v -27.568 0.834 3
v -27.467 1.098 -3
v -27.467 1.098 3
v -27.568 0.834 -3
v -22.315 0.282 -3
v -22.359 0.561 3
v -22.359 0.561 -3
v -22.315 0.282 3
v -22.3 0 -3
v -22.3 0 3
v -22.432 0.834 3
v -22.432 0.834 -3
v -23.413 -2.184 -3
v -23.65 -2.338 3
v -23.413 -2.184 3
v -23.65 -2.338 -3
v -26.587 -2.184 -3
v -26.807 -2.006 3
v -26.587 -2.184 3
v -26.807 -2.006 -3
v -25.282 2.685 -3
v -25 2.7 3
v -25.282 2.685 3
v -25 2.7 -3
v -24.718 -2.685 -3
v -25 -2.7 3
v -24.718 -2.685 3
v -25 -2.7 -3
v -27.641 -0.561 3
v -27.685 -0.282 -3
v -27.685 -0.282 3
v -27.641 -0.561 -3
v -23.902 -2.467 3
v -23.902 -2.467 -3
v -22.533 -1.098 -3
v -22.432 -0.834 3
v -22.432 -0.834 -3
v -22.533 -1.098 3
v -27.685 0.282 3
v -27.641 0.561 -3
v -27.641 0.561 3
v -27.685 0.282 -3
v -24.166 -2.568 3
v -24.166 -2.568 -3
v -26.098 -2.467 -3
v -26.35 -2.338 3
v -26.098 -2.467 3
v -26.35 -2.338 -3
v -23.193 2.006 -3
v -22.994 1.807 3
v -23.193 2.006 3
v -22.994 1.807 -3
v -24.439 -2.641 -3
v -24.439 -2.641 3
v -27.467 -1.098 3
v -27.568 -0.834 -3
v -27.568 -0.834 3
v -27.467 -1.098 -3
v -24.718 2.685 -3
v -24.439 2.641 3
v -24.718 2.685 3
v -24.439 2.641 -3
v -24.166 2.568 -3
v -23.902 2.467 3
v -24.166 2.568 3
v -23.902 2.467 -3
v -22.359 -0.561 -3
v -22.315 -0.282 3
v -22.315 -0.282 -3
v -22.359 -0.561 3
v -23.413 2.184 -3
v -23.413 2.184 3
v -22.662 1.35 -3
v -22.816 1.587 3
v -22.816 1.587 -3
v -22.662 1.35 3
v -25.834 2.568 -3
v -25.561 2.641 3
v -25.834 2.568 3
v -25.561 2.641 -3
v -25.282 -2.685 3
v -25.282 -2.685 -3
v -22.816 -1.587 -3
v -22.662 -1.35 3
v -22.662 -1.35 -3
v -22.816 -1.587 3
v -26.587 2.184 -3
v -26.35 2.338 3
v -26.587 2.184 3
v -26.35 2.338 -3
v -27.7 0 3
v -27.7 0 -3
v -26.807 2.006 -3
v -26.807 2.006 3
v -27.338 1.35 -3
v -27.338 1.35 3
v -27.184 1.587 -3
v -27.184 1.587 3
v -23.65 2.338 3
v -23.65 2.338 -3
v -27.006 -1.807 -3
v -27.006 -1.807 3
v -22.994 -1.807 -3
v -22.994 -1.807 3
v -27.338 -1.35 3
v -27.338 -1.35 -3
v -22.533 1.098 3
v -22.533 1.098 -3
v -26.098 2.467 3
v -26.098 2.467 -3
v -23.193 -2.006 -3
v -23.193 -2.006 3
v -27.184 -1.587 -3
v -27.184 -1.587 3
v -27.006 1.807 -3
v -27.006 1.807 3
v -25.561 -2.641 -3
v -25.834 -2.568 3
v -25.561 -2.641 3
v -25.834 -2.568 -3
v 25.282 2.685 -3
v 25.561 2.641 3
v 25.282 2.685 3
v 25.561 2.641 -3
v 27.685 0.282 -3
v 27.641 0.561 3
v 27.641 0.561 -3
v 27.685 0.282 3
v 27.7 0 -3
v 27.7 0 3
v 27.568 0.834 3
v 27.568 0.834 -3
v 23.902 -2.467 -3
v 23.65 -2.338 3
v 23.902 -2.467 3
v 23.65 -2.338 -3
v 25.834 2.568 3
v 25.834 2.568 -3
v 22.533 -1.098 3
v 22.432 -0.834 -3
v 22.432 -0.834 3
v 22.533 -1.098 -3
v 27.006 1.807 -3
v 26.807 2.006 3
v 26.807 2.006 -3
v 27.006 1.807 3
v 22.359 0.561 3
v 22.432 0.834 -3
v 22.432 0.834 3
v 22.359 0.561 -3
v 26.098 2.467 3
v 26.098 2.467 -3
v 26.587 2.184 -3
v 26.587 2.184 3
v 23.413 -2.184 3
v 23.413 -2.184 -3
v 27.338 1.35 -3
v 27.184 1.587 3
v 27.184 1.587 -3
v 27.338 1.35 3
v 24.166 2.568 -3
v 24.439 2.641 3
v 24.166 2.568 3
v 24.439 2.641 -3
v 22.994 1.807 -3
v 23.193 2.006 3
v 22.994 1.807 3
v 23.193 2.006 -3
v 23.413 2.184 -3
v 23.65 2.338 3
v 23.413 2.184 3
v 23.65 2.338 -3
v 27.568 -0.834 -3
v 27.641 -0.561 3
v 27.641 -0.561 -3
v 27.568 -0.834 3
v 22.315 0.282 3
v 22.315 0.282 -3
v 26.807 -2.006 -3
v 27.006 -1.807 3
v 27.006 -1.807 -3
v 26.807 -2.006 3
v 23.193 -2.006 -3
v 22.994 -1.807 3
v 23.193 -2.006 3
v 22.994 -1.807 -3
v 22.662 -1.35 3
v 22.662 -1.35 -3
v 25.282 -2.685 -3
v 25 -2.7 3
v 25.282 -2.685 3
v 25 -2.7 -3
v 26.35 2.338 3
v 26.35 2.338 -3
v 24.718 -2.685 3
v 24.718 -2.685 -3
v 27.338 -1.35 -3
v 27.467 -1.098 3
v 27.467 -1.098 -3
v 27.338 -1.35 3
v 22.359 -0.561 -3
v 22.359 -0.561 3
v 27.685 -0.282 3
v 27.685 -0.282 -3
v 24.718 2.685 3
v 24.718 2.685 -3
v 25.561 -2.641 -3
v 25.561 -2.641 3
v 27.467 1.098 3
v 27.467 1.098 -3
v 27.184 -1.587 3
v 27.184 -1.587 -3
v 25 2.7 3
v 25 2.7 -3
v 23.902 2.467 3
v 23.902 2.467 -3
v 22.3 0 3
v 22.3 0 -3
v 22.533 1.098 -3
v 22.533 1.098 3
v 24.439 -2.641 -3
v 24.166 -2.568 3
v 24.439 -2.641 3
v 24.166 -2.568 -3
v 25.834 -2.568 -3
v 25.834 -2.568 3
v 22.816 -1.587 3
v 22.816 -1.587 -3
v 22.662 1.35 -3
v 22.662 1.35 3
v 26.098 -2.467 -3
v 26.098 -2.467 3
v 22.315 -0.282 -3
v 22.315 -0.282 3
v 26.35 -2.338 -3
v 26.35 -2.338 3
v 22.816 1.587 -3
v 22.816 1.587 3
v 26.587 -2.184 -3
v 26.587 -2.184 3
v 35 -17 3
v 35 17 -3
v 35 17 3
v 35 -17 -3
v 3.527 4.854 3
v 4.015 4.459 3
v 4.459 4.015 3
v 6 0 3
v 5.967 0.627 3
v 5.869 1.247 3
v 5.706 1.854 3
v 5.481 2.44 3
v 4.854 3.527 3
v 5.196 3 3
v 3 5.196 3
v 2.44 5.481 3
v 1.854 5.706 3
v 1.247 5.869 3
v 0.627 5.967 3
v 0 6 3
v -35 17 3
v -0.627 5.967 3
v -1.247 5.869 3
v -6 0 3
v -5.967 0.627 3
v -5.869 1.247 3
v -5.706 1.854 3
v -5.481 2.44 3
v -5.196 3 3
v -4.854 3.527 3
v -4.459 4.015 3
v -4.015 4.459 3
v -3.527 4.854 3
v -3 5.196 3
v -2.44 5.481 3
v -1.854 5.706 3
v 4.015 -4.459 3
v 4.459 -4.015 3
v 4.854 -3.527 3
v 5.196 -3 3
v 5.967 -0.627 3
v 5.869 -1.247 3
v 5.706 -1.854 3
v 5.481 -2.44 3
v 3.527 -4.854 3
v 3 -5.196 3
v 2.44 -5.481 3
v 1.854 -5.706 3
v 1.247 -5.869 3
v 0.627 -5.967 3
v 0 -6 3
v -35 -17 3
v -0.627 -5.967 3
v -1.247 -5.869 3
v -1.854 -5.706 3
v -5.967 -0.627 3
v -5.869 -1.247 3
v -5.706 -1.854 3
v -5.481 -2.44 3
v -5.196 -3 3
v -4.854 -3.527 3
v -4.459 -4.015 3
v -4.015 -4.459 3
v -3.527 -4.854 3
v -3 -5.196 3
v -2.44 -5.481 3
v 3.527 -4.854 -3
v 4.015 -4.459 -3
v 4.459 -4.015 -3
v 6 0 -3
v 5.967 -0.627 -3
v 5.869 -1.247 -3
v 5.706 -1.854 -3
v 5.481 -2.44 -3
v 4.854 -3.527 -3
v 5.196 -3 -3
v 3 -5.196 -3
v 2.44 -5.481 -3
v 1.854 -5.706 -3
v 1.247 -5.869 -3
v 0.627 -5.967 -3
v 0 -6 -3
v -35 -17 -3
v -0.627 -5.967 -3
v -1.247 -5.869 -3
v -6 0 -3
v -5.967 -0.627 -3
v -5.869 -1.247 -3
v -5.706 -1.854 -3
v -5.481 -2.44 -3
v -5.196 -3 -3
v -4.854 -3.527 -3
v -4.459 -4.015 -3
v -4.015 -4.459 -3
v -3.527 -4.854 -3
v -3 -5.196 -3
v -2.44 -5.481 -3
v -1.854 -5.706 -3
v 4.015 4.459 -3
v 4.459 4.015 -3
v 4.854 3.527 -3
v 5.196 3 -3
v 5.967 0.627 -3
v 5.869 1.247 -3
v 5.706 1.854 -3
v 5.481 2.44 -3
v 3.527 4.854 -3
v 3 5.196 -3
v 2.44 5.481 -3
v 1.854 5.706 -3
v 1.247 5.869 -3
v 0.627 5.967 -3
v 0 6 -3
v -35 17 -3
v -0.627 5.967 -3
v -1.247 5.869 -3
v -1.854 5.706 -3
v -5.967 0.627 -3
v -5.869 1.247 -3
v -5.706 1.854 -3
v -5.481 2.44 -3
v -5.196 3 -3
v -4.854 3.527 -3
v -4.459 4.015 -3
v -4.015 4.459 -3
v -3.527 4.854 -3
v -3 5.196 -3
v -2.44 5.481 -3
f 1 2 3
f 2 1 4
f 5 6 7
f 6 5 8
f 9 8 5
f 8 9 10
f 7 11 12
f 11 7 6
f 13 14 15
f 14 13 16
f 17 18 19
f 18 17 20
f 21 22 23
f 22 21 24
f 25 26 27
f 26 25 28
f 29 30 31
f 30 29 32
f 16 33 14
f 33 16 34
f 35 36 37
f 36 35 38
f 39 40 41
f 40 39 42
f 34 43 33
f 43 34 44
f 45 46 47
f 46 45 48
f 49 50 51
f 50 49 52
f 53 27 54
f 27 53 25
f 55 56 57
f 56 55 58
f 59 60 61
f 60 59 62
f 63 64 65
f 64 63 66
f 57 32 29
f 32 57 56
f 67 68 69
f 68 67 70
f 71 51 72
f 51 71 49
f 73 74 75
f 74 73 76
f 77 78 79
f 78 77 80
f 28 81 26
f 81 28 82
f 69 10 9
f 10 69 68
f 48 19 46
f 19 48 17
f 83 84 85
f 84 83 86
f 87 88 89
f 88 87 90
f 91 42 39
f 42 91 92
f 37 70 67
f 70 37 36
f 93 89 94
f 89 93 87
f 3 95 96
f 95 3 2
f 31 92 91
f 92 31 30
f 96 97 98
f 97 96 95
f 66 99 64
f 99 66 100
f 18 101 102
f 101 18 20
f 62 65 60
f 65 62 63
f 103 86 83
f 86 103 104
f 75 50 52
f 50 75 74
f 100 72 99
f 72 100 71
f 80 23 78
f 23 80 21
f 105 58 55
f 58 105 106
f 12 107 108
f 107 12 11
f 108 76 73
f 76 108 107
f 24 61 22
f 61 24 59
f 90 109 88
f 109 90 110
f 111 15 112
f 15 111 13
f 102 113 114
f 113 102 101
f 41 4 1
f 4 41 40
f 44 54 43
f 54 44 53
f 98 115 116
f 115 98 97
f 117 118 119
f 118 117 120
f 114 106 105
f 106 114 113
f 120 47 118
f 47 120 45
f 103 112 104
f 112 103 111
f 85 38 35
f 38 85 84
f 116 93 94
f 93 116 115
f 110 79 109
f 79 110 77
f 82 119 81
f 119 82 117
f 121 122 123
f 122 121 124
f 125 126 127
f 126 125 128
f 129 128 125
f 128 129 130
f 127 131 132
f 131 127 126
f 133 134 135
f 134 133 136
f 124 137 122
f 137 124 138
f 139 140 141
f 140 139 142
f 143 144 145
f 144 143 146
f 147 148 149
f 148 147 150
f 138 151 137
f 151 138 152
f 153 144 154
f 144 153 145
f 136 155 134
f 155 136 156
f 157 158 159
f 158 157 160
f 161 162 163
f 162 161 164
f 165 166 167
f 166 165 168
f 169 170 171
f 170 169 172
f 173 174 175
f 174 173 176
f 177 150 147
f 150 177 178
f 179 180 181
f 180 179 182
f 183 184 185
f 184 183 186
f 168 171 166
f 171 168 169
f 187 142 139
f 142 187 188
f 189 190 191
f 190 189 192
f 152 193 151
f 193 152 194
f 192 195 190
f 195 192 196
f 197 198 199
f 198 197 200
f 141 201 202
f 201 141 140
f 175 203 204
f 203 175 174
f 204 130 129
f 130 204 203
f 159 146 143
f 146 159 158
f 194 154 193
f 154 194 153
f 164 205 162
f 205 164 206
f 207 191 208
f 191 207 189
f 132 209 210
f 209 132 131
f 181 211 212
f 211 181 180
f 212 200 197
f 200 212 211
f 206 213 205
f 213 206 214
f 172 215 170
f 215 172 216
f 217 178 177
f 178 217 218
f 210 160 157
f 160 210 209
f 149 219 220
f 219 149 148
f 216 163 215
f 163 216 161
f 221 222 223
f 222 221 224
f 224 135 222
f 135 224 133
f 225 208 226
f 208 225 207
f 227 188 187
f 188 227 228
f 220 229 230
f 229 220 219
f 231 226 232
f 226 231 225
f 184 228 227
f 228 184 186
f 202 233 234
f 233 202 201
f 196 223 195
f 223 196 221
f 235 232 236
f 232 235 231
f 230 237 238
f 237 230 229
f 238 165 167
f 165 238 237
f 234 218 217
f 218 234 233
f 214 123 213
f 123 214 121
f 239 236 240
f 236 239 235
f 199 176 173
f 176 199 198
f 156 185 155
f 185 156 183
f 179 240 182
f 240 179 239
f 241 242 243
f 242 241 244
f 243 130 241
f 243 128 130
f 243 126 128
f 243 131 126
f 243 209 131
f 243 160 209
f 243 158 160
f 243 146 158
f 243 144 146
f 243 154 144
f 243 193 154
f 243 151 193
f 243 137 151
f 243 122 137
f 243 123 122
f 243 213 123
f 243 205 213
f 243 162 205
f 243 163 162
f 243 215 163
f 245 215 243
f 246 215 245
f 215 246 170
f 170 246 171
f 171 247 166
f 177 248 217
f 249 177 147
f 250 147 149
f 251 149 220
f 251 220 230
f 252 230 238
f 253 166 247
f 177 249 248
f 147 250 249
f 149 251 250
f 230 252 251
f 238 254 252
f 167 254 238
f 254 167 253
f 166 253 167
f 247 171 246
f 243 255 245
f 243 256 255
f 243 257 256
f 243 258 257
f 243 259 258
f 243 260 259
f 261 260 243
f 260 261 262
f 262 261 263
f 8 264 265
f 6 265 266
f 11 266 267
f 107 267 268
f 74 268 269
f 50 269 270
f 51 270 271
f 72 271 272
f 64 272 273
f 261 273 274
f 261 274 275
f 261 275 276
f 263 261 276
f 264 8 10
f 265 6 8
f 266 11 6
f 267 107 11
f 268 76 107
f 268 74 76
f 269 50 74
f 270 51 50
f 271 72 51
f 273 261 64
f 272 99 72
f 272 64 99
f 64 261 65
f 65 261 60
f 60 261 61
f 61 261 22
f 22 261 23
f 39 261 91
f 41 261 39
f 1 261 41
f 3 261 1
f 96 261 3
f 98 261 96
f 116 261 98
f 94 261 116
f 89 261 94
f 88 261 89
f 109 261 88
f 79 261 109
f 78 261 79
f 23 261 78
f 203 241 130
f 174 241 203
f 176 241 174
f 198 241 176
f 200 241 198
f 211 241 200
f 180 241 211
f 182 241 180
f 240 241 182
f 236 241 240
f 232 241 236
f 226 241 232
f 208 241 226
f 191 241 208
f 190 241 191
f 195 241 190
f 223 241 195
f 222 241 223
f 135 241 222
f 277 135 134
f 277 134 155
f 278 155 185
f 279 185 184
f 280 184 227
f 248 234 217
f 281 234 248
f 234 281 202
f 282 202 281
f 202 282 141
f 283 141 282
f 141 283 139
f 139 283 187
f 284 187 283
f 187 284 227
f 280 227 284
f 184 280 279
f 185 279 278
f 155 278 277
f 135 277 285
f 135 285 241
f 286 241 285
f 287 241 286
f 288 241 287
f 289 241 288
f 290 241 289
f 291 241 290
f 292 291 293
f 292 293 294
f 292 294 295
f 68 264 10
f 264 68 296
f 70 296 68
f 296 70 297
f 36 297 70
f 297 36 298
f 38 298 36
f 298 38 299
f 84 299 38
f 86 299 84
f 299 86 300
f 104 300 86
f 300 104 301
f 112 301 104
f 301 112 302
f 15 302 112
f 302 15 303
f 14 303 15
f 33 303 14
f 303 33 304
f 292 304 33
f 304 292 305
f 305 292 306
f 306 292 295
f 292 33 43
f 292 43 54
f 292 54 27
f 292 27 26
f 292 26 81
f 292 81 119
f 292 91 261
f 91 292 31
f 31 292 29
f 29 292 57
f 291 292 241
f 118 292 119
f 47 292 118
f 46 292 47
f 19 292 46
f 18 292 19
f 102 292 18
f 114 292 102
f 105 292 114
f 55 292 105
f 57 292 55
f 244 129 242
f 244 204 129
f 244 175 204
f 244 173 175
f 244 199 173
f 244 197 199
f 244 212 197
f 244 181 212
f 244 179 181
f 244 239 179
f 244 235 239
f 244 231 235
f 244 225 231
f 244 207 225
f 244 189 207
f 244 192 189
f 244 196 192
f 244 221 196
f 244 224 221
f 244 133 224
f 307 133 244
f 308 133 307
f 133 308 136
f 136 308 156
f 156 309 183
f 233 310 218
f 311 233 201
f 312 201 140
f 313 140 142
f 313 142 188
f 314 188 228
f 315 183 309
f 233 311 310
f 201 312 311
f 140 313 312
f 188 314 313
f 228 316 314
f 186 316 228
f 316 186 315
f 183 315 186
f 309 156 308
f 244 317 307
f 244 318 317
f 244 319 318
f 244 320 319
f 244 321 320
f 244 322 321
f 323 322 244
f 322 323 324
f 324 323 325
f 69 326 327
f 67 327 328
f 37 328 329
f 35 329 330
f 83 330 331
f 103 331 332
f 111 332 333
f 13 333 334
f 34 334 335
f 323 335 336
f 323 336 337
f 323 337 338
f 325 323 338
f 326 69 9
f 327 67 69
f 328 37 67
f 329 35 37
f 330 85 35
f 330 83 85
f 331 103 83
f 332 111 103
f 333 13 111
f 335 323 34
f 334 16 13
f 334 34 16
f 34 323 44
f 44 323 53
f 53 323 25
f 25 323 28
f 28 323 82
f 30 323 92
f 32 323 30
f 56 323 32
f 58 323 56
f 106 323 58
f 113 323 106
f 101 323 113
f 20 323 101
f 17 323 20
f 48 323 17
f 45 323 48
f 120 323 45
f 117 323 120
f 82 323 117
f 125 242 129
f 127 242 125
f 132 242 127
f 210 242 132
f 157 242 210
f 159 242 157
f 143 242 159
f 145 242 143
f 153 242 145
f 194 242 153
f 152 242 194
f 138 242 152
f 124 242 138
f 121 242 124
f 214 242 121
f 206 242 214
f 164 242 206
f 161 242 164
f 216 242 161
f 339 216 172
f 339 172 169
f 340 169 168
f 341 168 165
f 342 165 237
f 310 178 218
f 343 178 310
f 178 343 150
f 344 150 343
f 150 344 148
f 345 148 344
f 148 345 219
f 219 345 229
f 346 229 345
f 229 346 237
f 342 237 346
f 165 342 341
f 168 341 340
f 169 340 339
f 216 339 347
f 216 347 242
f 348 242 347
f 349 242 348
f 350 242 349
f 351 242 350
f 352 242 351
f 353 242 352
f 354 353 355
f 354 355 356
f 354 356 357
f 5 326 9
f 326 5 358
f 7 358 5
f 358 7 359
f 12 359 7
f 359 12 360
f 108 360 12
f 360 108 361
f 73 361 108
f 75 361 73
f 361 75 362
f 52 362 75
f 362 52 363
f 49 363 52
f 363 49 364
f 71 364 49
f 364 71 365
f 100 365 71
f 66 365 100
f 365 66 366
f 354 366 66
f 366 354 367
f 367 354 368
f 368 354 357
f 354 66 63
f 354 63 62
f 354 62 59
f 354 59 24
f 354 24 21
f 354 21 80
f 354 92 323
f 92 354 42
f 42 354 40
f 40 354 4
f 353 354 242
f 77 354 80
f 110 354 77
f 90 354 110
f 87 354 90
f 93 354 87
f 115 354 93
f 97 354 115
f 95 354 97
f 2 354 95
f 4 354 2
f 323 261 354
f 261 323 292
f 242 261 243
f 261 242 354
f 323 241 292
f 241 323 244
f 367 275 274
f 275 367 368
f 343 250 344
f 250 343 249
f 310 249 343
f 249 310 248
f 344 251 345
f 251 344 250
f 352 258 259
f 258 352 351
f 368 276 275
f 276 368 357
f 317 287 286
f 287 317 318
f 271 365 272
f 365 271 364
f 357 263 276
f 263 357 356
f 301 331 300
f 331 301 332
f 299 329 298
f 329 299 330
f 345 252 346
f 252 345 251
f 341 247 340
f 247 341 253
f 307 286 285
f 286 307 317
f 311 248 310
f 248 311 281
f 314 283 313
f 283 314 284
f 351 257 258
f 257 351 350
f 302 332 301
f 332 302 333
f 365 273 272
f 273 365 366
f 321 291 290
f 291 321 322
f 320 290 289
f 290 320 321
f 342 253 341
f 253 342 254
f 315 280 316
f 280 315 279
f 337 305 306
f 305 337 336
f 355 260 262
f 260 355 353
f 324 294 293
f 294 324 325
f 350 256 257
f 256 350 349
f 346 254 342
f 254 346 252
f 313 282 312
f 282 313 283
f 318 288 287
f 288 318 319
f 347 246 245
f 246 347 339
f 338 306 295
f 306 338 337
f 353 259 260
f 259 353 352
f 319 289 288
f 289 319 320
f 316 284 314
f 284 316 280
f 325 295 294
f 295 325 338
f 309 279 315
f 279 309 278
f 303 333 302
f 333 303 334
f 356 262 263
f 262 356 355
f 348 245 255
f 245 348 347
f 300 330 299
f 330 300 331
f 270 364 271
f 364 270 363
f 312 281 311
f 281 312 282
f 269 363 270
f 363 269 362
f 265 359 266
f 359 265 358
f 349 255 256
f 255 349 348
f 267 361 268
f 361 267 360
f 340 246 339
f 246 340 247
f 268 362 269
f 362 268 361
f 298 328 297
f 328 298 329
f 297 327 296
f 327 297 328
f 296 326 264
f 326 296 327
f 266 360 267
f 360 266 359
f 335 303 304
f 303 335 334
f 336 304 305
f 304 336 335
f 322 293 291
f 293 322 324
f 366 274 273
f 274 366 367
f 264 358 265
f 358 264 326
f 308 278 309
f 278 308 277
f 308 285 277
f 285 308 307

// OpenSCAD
// Rod-end mounting plate.
$fn = 60;
eps = 0.02;
plate_l = 70;
plate_w = 34;
plate_t = 6;
bore_d = 12;
difference() {
    cube([plate_l, plate_w, plate_t], center = true);
    translate([0, 0, -plate_t / 2 - eps]) cylinder(d = bore_d, h = plate_t + 2 * eps);
    for (x = [-plate_l / 2 + 10, plate_l / 2 - 10])
        translate([x, 0, -plate_t / 2 - eps]) cylinder(d = 5.4, h = plate_t + 2 * eps);
}
